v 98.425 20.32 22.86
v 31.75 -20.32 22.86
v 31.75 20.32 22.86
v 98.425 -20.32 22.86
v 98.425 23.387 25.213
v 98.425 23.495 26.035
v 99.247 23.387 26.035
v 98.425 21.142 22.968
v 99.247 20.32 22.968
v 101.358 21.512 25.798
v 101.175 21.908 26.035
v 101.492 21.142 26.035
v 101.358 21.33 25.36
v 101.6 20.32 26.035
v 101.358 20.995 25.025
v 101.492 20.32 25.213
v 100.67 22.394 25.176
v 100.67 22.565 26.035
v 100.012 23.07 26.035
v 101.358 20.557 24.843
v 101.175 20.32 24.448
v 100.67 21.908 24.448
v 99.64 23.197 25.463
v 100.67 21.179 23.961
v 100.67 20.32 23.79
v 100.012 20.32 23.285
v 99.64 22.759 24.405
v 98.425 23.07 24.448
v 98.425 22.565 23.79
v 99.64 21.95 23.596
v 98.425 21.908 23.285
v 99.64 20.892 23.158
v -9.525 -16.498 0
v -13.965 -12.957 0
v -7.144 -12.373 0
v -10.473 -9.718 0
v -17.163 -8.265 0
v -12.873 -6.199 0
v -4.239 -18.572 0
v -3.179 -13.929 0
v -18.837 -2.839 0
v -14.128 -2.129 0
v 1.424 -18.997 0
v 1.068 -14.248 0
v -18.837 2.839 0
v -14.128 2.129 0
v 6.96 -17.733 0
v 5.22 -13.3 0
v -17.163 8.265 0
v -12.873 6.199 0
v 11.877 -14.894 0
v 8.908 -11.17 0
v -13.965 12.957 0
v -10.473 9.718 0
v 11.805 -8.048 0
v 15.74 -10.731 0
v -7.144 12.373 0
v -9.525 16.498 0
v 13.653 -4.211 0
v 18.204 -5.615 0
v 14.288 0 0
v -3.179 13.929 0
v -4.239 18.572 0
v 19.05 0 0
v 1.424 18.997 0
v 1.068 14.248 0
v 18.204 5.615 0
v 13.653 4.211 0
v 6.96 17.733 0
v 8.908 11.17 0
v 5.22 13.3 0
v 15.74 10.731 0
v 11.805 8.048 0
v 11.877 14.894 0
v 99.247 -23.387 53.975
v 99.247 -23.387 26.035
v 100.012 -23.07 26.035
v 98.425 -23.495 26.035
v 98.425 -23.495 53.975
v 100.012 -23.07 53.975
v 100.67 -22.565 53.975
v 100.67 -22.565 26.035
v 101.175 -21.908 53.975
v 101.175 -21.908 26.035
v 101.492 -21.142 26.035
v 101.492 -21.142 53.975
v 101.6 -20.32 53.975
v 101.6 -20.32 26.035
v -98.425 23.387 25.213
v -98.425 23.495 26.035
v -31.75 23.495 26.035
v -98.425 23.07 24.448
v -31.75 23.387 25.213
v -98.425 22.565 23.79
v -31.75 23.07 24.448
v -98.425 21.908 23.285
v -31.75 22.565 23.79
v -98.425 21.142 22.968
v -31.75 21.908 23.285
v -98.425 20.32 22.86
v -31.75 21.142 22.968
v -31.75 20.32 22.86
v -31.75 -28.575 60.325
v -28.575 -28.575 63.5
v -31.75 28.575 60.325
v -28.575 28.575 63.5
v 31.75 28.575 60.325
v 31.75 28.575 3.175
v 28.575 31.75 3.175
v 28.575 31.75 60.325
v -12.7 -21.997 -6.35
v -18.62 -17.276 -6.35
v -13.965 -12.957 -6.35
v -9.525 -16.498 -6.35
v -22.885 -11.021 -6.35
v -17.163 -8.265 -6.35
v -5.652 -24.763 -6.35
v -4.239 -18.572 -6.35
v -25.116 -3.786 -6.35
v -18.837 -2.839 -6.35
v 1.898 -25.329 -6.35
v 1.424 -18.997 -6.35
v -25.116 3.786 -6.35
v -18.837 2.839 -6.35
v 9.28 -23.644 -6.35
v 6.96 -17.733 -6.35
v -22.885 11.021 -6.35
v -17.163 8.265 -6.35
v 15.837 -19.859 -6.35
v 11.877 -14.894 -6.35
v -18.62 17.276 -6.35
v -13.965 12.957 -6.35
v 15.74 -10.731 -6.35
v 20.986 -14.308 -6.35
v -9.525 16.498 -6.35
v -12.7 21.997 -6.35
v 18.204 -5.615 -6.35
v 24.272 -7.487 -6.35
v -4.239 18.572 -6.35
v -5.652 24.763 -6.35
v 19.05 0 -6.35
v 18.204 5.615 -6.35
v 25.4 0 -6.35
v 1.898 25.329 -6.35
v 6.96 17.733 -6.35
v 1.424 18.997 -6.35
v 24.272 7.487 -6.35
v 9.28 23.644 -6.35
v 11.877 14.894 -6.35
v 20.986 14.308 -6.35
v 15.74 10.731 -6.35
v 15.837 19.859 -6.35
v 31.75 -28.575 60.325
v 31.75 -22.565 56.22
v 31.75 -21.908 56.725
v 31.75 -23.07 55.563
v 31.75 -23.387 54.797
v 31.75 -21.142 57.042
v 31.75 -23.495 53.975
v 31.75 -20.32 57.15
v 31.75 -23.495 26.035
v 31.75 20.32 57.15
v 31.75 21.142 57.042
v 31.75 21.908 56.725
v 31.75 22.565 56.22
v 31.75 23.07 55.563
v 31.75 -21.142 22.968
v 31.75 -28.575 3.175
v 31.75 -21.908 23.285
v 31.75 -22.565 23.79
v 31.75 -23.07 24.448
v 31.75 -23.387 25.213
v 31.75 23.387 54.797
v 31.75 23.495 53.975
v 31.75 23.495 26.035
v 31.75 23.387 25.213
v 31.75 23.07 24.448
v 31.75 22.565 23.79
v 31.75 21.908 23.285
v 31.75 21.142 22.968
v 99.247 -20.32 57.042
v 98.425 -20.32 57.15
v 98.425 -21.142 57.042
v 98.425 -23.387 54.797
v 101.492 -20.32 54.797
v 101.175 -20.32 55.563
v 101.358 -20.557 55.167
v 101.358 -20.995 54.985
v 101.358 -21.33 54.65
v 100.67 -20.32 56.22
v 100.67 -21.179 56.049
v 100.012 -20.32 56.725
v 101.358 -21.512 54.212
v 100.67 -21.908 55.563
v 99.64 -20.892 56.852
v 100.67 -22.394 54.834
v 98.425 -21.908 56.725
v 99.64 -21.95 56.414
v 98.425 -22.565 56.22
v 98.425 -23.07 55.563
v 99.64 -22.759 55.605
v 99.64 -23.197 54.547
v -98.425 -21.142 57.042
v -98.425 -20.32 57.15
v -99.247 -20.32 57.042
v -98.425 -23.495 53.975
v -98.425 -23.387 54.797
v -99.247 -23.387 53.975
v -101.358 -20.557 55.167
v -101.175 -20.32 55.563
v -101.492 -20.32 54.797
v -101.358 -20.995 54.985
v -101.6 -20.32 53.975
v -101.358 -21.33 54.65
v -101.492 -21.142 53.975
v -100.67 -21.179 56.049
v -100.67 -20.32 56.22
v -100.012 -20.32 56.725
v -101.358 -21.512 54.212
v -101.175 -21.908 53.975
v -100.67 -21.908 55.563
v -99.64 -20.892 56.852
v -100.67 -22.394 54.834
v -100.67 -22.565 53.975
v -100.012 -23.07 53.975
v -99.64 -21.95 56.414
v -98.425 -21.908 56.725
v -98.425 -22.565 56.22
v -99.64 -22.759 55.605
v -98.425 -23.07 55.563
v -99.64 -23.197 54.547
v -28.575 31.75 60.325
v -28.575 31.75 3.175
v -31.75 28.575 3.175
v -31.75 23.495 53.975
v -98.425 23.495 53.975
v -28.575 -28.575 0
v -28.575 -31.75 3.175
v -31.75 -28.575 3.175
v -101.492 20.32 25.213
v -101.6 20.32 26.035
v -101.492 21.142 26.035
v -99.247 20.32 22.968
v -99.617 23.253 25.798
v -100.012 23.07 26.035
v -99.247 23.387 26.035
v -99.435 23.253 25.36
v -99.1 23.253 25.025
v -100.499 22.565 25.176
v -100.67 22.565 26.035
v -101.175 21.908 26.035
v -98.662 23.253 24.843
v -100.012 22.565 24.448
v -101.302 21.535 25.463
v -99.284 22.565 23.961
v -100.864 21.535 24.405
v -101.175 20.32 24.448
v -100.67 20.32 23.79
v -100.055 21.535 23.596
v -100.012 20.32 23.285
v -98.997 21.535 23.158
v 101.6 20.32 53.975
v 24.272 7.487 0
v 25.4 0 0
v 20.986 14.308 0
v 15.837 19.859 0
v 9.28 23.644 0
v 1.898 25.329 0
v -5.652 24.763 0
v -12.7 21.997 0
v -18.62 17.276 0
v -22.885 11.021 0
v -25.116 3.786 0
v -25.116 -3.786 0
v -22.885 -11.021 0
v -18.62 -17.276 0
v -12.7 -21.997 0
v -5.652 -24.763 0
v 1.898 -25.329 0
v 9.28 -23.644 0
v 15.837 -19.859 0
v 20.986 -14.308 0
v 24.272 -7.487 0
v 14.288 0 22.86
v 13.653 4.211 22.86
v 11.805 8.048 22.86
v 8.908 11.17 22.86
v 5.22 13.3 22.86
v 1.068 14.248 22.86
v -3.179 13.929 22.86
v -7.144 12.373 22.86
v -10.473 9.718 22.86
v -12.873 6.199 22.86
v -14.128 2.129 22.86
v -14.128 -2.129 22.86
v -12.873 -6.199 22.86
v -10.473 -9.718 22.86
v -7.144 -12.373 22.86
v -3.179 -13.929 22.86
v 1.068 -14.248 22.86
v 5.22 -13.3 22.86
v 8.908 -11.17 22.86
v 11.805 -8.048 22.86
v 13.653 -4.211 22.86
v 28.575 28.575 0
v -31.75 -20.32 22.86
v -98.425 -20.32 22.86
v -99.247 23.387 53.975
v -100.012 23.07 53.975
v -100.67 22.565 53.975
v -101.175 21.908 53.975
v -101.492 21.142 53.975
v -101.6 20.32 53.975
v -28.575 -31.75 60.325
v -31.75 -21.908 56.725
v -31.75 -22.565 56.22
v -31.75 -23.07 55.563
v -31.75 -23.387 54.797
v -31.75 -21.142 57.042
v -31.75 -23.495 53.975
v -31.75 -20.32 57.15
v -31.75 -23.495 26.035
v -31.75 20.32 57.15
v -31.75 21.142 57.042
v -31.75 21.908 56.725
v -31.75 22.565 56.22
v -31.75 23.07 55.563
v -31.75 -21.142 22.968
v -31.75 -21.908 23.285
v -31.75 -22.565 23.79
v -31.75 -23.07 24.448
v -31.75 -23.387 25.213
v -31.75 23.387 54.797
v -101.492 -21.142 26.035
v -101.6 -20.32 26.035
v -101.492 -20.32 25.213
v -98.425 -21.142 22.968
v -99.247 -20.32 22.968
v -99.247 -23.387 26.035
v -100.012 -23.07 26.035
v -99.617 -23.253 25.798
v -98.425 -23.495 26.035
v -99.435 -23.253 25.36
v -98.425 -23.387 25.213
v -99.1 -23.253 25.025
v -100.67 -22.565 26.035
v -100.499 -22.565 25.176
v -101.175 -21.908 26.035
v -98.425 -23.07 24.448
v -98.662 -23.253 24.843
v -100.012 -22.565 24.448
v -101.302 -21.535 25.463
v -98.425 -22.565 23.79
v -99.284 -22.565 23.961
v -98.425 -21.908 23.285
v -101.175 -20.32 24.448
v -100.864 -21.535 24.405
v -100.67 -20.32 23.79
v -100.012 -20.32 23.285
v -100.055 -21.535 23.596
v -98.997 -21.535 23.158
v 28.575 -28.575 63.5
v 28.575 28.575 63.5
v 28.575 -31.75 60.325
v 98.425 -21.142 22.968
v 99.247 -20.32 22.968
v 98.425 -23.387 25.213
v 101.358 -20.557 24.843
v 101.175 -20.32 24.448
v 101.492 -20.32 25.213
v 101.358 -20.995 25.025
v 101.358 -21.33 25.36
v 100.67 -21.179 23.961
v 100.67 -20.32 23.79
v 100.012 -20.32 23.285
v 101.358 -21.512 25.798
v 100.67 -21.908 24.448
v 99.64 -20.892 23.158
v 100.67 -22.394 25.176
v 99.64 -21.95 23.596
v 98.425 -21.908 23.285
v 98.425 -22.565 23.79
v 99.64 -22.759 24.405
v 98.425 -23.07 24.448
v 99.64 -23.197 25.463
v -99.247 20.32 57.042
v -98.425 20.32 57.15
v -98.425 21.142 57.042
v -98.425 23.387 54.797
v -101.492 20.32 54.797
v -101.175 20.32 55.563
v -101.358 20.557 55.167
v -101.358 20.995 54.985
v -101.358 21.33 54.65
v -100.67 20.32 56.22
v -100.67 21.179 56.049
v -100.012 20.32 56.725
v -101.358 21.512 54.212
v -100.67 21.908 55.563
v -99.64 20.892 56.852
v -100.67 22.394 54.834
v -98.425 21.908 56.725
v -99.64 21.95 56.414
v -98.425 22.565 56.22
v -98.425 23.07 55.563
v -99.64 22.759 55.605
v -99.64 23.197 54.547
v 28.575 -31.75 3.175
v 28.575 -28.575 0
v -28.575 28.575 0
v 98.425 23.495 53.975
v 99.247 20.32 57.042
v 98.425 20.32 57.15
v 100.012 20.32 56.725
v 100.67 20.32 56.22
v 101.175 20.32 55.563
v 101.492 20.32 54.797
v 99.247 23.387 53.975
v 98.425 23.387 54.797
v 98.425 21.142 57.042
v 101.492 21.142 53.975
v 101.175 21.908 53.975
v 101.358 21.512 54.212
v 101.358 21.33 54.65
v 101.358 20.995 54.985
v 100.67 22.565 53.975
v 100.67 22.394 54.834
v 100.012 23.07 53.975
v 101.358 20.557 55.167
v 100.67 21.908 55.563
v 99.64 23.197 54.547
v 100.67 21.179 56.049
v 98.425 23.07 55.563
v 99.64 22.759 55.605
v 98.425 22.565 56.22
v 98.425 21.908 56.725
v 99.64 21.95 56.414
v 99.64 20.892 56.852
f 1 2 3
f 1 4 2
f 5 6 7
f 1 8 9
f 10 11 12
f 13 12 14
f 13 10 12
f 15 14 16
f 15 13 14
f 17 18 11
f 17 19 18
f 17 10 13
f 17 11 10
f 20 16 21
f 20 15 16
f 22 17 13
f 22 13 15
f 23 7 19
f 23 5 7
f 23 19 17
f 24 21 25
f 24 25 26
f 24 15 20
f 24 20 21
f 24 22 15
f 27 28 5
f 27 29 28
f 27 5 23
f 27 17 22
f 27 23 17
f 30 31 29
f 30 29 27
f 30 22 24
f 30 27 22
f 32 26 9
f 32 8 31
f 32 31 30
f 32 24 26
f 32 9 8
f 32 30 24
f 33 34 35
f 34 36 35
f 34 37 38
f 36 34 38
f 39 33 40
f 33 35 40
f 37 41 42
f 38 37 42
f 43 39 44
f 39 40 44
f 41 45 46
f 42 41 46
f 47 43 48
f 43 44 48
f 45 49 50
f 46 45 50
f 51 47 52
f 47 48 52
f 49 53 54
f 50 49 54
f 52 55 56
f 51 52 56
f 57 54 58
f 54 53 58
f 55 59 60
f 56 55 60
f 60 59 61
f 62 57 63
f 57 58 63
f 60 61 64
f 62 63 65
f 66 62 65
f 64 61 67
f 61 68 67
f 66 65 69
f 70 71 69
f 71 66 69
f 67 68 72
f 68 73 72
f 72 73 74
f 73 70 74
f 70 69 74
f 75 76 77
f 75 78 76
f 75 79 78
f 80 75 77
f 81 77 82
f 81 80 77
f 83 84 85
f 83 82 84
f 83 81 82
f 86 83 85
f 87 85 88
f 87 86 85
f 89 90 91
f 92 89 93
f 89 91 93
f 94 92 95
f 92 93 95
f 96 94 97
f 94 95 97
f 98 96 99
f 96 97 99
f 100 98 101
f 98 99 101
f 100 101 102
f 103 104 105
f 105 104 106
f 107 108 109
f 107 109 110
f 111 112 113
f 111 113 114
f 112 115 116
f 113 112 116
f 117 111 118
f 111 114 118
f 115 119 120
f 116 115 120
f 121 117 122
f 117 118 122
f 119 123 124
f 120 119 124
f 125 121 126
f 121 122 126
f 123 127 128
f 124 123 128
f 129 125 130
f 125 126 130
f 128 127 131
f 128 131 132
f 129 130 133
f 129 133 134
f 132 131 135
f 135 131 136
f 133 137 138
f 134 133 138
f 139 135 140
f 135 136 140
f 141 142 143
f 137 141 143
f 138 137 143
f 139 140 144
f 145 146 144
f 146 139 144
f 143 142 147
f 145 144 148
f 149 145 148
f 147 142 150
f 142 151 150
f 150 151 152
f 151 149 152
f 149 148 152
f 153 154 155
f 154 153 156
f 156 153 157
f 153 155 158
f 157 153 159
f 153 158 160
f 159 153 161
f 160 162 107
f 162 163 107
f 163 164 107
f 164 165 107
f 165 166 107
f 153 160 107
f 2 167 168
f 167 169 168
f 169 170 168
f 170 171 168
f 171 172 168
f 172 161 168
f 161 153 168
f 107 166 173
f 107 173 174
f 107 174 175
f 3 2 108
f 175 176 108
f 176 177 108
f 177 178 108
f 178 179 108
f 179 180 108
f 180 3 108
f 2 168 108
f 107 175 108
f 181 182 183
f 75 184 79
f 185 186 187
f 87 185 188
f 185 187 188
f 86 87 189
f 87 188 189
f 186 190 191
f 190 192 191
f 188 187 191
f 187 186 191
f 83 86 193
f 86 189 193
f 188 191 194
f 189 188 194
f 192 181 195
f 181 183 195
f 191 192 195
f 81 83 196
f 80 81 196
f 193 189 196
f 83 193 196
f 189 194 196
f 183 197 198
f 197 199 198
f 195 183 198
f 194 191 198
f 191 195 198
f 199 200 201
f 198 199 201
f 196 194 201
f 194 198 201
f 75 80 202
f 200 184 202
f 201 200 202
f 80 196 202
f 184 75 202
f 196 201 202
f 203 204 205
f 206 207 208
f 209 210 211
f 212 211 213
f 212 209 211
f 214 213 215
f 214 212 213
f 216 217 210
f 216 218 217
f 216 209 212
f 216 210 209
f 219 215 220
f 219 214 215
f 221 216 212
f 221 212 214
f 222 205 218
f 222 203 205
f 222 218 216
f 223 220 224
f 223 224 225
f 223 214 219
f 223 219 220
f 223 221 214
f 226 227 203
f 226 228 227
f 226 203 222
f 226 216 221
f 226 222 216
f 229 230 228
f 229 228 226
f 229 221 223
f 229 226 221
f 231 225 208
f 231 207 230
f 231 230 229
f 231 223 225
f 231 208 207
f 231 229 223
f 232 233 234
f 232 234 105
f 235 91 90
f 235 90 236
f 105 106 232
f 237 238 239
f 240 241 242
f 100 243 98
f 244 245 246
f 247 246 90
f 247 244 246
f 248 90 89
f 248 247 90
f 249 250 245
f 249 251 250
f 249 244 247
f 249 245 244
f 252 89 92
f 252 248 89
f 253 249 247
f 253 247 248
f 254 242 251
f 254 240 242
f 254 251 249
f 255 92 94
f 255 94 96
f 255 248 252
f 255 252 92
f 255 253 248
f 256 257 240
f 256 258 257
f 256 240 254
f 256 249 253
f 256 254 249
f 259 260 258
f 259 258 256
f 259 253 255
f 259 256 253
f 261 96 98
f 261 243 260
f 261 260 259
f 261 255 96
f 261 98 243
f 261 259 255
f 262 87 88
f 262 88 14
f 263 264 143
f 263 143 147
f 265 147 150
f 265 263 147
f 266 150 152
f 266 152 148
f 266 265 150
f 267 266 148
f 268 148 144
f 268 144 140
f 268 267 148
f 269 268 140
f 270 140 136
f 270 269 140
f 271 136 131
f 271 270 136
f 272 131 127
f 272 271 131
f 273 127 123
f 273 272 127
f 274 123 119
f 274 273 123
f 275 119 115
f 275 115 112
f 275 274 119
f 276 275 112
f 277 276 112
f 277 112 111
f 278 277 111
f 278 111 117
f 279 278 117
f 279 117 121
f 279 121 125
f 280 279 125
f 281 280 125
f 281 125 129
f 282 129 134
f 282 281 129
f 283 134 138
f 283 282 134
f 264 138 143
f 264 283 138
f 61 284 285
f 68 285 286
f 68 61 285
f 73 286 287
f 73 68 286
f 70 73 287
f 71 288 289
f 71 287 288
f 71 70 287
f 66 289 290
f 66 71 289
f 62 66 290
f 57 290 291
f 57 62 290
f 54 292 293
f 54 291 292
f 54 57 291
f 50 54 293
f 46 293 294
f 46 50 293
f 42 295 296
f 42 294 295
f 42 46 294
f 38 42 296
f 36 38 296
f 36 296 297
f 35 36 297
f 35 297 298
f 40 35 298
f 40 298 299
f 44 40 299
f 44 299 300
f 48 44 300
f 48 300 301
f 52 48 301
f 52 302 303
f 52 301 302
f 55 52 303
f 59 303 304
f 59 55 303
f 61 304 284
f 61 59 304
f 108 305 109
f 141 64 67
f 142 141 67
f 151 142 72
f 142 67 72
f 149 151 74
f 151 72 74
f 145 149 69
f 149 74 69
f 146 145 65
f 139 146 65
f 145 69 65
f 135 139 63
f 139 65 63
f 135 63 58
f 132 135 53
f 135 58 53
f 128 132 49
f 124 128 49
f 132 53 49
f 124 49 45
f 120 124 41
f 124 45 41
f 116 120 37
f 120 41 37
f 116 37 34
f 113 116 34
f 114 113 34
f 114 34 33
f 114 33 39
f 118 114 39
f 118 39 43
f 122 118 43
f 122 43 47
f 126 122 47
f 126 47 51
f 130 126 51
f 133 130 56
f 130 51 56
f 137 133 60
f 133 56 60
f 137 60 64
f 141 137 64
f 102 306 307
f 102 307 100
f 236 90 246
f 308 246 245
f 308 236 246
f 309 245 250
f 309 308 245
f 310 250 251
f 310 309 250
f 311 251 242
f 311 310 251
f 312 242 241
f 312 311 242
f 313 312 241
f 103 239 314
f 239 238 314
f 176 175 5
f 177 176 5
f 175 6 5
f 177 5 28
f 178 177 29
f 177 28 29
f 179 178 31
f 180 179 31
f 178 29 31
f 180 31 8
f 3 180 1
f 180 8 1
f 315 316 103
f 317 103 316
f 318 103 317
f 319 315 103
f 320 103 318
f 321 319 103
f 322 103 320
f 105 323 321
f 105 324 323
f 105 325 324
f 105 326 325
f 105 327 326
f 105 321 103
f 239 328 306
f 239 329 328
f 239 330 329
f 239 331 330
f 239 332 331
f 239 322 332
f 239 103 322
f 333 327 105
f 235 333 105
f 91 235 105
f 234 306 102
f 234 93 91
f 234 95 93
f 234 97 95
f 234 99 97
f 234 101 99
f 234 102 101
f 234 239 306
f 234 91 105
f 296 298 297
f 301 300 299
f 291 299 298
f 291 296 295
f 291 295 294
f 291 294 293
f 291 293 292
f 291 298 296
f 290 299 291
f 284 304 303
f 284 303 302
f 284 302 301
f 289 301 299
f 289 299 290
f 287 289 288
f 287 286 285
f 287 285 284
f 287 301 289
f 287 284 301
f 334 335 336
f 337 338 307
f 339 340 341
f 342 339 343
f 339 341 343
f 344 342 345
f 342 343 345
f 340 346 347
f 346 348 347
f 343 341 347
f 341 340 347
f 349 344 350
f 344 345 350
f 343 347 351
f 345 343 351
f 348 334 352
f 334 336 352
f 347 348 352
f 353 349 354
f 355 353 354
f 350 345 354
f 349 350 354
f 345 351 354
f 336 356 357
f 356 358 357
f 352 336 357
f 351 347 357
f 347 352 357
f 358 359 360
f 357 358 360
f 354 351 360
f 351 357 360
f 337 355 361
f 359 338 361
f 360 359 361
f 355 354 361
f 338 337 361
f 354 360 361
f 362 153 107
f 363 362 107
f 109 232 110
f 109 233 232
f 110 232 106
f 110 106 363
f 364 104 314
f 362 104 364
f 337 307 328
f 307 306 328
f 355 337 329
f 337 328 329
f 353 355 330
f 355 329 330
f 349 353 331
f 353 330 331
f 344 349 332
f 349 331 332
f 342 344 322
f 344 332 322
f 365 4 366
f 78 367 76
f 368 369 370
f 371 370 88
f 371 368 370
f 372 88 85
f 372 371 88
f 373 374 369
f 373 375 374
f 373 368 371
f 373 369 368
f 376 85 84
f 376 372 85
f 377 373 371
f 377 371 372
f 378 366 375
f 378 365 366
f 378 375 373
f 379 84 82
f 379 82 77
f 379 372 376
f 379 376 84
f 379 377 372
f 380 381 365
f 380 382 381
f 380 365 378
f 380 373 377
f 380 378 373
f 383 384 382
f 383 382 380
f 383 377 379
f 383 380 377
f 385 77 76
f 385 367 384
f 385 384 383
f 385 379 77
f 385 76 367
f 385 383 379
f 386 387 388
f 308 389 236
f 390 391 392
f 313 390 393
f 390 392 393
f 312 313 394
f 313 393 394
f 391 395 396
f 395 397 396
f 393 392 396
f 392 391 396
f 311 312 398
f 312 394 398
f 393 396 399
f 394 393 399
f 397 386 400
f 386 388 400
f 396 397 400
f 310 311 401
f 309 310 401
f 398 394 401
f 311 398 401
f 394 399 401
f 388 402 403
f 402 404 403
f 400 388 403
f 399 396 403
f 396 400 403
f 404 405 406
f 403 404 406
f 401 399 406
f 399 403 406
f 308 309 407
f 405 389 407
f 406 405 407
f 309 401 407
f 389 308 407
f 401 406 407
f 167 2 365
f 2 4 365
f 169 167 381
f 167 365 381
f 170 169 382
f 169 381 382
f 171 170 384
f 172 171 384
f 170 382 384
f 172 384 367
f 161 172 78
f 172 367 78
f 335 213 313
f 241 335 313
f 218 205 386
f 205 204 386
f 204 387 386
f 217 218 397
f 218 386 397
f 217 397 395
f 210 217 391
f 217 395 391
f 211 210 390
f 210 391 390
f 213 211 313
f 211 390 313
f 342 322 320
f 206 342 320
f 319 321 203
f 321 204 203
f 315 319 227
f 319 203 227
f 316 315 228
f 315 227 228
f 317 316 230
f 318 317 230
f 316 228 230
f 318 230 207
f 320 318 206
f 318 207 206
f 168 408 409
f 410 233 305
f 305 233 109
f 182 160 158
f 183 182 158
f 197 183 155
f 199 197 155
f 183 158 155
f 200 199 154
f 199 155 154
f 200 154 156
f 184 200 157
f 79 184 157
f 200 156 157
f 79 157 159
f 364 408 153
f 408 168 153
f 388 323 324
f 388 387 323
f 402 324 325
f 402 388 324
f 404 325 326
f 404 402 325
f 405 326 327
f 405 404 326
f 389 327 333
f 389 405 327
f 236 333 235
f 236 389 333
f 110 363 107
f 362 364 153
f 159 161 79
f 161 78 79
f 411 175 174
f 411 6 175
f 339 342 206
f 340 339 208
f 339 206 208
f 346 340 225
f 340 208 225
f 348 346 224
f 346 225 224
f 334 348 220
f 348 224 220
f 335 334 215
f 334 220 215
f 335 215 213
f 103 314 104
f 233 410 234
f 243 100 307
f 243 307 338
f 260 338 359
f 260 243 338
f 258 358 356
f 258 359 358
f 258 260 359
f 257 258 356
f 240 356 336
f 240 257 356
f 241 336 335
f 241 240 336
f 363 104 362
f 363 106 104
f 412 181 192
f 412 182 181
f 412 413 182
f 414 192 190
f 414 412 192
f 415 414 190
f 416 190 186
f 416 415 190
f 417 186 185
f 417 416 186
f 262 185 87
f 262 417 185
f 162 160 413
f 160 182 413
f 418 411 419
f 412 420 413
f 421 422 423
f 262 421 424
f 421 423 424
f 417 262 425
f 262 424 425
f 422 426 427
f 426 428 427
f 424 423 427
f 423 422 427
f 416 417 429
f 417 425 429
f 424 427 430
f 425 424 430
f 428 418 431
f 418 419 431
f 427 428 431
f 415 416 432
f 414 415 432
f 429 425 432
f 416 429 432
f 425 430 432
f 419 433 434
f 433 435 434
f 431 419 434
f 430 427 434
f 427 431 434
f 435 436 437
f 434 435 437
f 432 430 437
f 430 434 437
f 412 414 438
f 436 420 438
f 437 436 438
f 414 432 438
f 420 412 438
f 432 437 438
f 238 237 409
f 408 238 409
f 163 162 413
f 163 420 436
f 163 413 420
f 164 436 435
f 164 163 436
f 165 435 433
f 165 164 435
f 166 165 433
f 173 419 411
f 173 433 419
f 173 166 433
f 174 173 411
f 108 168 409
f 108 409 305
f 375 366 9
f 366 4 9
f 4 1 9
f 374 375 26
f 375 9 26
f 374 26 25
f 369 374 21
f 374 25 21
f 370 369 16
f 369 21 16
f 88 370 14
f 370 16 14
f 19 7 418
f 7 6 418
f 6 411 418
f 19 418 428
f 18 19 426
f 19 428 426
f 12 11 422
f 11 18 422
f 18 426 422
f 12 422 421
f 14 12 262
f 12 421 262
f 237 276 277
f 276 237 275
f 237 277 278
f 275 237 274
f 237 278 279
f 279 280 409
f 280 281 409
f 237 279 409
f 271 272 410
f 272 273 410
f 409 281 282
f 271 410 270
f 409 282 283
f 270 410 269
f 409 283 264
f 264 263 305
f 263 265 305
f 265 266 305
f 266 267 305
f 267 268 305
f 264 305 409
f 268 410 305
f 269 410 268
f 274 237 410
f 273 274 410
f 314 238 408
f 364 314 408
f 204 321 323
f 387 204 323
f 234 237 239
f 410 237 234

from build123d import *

# Parameters (mm, degrees)
F0_W     = 63.5
F0_H     = 63.5
F1_DEPTH = 63.5
F2_R     = 14.2875
F3_DEPTH = 50.8
F2_R_2   = 25.4
F2_R_3   = 19.05
F4_DEPTH = 6.35
F5_W     = 46.99
F5_H     = 34.29
F6_DEPTH = 101.6
F7_SIZE  = 3.175
F8_R     = 3.175


with BuildPart() as f1:
    # F0 (on Top) → F1 (new body)
    with BuildSketch(Plane.XY):
        Rectangle(F0_W, F0_H)
    extrude(amount=F1_DEPTH)

    # F2 (on Top) → F3 (cut)
    with BuildSketch(Plane.XY):
        Circle(F2_R)
    extrude(amount=F3_DEPTH, mode=Mode.SUBTRACT)

    # F2 (on Top) → F4 (join)
    with BuildSketch(Plane.XY):
        Circle(F2_R_2)
        Circle(F2_R_3, mode=Mode.SUBTRACT)
    extrude(amount=-F4_DEPTH)

    # F5 (on Right) → F6 (join, symmetric)
    with BuildSketch(Plane.YZ):
        with Locations((0, 40.005002)):
            Rectangle(F5_W, F5_H)
    extrude(amount=F6_DEPTH, both=True)

    # F7
    f7_edges = [f1.edges().sort_by_distance(p)[0] for p in [
        (-31.75, -31.75, 31.75),
        (31.75, -31.75, 31.75),
        (0, -31.75, 0),
        (0, -31.75, 63.5),
        (31.75, 0, 63.5),
        (31.75, 0, 0),
        (-31.75, 0, 63.5),
        (0, 31.75, 63.5),
        (-31.75, 0, 0),
        (0, 31.75, 0),
        (-31.75, 31.75, 31.75),
        (31.75, 31.75, 31.75),
    ]]
    chamfer(f7_edges, length=F7_SIZE)

    # F8
    f8_edges = [f1.edges().sort_by_distance(p)[0] for p in [
        (66.675, -23.495, 57.150002),
        (-66.675, -23.495, 57.150002),
        (66.675, 23.495, 57.150002),
        (-66.675, 23.495, 57.150002),
        (-101.6, 0, 57.150002),
        (-101.6, 0, 22.860002),
        (-101.6, -23.495, 40.005002),
        (-101.6, 23.495, 40.005002),
        (66.675, -23.495, 22.860002),
        (-66.675, -23.495, 22.860002),
        (66.675, 23.495, 22.860002),
        (-66.675, 23.495, 22.860002),
        (101.6, 23.495, 40.005002),
        (101.6, 0, 57.150002),
        (101.6, 0, 22.860002),
        (101.6, -23.495, 40.005002),
    ]]
    fillet(f8_edges, radius=F8_R)


solid = f1.part
